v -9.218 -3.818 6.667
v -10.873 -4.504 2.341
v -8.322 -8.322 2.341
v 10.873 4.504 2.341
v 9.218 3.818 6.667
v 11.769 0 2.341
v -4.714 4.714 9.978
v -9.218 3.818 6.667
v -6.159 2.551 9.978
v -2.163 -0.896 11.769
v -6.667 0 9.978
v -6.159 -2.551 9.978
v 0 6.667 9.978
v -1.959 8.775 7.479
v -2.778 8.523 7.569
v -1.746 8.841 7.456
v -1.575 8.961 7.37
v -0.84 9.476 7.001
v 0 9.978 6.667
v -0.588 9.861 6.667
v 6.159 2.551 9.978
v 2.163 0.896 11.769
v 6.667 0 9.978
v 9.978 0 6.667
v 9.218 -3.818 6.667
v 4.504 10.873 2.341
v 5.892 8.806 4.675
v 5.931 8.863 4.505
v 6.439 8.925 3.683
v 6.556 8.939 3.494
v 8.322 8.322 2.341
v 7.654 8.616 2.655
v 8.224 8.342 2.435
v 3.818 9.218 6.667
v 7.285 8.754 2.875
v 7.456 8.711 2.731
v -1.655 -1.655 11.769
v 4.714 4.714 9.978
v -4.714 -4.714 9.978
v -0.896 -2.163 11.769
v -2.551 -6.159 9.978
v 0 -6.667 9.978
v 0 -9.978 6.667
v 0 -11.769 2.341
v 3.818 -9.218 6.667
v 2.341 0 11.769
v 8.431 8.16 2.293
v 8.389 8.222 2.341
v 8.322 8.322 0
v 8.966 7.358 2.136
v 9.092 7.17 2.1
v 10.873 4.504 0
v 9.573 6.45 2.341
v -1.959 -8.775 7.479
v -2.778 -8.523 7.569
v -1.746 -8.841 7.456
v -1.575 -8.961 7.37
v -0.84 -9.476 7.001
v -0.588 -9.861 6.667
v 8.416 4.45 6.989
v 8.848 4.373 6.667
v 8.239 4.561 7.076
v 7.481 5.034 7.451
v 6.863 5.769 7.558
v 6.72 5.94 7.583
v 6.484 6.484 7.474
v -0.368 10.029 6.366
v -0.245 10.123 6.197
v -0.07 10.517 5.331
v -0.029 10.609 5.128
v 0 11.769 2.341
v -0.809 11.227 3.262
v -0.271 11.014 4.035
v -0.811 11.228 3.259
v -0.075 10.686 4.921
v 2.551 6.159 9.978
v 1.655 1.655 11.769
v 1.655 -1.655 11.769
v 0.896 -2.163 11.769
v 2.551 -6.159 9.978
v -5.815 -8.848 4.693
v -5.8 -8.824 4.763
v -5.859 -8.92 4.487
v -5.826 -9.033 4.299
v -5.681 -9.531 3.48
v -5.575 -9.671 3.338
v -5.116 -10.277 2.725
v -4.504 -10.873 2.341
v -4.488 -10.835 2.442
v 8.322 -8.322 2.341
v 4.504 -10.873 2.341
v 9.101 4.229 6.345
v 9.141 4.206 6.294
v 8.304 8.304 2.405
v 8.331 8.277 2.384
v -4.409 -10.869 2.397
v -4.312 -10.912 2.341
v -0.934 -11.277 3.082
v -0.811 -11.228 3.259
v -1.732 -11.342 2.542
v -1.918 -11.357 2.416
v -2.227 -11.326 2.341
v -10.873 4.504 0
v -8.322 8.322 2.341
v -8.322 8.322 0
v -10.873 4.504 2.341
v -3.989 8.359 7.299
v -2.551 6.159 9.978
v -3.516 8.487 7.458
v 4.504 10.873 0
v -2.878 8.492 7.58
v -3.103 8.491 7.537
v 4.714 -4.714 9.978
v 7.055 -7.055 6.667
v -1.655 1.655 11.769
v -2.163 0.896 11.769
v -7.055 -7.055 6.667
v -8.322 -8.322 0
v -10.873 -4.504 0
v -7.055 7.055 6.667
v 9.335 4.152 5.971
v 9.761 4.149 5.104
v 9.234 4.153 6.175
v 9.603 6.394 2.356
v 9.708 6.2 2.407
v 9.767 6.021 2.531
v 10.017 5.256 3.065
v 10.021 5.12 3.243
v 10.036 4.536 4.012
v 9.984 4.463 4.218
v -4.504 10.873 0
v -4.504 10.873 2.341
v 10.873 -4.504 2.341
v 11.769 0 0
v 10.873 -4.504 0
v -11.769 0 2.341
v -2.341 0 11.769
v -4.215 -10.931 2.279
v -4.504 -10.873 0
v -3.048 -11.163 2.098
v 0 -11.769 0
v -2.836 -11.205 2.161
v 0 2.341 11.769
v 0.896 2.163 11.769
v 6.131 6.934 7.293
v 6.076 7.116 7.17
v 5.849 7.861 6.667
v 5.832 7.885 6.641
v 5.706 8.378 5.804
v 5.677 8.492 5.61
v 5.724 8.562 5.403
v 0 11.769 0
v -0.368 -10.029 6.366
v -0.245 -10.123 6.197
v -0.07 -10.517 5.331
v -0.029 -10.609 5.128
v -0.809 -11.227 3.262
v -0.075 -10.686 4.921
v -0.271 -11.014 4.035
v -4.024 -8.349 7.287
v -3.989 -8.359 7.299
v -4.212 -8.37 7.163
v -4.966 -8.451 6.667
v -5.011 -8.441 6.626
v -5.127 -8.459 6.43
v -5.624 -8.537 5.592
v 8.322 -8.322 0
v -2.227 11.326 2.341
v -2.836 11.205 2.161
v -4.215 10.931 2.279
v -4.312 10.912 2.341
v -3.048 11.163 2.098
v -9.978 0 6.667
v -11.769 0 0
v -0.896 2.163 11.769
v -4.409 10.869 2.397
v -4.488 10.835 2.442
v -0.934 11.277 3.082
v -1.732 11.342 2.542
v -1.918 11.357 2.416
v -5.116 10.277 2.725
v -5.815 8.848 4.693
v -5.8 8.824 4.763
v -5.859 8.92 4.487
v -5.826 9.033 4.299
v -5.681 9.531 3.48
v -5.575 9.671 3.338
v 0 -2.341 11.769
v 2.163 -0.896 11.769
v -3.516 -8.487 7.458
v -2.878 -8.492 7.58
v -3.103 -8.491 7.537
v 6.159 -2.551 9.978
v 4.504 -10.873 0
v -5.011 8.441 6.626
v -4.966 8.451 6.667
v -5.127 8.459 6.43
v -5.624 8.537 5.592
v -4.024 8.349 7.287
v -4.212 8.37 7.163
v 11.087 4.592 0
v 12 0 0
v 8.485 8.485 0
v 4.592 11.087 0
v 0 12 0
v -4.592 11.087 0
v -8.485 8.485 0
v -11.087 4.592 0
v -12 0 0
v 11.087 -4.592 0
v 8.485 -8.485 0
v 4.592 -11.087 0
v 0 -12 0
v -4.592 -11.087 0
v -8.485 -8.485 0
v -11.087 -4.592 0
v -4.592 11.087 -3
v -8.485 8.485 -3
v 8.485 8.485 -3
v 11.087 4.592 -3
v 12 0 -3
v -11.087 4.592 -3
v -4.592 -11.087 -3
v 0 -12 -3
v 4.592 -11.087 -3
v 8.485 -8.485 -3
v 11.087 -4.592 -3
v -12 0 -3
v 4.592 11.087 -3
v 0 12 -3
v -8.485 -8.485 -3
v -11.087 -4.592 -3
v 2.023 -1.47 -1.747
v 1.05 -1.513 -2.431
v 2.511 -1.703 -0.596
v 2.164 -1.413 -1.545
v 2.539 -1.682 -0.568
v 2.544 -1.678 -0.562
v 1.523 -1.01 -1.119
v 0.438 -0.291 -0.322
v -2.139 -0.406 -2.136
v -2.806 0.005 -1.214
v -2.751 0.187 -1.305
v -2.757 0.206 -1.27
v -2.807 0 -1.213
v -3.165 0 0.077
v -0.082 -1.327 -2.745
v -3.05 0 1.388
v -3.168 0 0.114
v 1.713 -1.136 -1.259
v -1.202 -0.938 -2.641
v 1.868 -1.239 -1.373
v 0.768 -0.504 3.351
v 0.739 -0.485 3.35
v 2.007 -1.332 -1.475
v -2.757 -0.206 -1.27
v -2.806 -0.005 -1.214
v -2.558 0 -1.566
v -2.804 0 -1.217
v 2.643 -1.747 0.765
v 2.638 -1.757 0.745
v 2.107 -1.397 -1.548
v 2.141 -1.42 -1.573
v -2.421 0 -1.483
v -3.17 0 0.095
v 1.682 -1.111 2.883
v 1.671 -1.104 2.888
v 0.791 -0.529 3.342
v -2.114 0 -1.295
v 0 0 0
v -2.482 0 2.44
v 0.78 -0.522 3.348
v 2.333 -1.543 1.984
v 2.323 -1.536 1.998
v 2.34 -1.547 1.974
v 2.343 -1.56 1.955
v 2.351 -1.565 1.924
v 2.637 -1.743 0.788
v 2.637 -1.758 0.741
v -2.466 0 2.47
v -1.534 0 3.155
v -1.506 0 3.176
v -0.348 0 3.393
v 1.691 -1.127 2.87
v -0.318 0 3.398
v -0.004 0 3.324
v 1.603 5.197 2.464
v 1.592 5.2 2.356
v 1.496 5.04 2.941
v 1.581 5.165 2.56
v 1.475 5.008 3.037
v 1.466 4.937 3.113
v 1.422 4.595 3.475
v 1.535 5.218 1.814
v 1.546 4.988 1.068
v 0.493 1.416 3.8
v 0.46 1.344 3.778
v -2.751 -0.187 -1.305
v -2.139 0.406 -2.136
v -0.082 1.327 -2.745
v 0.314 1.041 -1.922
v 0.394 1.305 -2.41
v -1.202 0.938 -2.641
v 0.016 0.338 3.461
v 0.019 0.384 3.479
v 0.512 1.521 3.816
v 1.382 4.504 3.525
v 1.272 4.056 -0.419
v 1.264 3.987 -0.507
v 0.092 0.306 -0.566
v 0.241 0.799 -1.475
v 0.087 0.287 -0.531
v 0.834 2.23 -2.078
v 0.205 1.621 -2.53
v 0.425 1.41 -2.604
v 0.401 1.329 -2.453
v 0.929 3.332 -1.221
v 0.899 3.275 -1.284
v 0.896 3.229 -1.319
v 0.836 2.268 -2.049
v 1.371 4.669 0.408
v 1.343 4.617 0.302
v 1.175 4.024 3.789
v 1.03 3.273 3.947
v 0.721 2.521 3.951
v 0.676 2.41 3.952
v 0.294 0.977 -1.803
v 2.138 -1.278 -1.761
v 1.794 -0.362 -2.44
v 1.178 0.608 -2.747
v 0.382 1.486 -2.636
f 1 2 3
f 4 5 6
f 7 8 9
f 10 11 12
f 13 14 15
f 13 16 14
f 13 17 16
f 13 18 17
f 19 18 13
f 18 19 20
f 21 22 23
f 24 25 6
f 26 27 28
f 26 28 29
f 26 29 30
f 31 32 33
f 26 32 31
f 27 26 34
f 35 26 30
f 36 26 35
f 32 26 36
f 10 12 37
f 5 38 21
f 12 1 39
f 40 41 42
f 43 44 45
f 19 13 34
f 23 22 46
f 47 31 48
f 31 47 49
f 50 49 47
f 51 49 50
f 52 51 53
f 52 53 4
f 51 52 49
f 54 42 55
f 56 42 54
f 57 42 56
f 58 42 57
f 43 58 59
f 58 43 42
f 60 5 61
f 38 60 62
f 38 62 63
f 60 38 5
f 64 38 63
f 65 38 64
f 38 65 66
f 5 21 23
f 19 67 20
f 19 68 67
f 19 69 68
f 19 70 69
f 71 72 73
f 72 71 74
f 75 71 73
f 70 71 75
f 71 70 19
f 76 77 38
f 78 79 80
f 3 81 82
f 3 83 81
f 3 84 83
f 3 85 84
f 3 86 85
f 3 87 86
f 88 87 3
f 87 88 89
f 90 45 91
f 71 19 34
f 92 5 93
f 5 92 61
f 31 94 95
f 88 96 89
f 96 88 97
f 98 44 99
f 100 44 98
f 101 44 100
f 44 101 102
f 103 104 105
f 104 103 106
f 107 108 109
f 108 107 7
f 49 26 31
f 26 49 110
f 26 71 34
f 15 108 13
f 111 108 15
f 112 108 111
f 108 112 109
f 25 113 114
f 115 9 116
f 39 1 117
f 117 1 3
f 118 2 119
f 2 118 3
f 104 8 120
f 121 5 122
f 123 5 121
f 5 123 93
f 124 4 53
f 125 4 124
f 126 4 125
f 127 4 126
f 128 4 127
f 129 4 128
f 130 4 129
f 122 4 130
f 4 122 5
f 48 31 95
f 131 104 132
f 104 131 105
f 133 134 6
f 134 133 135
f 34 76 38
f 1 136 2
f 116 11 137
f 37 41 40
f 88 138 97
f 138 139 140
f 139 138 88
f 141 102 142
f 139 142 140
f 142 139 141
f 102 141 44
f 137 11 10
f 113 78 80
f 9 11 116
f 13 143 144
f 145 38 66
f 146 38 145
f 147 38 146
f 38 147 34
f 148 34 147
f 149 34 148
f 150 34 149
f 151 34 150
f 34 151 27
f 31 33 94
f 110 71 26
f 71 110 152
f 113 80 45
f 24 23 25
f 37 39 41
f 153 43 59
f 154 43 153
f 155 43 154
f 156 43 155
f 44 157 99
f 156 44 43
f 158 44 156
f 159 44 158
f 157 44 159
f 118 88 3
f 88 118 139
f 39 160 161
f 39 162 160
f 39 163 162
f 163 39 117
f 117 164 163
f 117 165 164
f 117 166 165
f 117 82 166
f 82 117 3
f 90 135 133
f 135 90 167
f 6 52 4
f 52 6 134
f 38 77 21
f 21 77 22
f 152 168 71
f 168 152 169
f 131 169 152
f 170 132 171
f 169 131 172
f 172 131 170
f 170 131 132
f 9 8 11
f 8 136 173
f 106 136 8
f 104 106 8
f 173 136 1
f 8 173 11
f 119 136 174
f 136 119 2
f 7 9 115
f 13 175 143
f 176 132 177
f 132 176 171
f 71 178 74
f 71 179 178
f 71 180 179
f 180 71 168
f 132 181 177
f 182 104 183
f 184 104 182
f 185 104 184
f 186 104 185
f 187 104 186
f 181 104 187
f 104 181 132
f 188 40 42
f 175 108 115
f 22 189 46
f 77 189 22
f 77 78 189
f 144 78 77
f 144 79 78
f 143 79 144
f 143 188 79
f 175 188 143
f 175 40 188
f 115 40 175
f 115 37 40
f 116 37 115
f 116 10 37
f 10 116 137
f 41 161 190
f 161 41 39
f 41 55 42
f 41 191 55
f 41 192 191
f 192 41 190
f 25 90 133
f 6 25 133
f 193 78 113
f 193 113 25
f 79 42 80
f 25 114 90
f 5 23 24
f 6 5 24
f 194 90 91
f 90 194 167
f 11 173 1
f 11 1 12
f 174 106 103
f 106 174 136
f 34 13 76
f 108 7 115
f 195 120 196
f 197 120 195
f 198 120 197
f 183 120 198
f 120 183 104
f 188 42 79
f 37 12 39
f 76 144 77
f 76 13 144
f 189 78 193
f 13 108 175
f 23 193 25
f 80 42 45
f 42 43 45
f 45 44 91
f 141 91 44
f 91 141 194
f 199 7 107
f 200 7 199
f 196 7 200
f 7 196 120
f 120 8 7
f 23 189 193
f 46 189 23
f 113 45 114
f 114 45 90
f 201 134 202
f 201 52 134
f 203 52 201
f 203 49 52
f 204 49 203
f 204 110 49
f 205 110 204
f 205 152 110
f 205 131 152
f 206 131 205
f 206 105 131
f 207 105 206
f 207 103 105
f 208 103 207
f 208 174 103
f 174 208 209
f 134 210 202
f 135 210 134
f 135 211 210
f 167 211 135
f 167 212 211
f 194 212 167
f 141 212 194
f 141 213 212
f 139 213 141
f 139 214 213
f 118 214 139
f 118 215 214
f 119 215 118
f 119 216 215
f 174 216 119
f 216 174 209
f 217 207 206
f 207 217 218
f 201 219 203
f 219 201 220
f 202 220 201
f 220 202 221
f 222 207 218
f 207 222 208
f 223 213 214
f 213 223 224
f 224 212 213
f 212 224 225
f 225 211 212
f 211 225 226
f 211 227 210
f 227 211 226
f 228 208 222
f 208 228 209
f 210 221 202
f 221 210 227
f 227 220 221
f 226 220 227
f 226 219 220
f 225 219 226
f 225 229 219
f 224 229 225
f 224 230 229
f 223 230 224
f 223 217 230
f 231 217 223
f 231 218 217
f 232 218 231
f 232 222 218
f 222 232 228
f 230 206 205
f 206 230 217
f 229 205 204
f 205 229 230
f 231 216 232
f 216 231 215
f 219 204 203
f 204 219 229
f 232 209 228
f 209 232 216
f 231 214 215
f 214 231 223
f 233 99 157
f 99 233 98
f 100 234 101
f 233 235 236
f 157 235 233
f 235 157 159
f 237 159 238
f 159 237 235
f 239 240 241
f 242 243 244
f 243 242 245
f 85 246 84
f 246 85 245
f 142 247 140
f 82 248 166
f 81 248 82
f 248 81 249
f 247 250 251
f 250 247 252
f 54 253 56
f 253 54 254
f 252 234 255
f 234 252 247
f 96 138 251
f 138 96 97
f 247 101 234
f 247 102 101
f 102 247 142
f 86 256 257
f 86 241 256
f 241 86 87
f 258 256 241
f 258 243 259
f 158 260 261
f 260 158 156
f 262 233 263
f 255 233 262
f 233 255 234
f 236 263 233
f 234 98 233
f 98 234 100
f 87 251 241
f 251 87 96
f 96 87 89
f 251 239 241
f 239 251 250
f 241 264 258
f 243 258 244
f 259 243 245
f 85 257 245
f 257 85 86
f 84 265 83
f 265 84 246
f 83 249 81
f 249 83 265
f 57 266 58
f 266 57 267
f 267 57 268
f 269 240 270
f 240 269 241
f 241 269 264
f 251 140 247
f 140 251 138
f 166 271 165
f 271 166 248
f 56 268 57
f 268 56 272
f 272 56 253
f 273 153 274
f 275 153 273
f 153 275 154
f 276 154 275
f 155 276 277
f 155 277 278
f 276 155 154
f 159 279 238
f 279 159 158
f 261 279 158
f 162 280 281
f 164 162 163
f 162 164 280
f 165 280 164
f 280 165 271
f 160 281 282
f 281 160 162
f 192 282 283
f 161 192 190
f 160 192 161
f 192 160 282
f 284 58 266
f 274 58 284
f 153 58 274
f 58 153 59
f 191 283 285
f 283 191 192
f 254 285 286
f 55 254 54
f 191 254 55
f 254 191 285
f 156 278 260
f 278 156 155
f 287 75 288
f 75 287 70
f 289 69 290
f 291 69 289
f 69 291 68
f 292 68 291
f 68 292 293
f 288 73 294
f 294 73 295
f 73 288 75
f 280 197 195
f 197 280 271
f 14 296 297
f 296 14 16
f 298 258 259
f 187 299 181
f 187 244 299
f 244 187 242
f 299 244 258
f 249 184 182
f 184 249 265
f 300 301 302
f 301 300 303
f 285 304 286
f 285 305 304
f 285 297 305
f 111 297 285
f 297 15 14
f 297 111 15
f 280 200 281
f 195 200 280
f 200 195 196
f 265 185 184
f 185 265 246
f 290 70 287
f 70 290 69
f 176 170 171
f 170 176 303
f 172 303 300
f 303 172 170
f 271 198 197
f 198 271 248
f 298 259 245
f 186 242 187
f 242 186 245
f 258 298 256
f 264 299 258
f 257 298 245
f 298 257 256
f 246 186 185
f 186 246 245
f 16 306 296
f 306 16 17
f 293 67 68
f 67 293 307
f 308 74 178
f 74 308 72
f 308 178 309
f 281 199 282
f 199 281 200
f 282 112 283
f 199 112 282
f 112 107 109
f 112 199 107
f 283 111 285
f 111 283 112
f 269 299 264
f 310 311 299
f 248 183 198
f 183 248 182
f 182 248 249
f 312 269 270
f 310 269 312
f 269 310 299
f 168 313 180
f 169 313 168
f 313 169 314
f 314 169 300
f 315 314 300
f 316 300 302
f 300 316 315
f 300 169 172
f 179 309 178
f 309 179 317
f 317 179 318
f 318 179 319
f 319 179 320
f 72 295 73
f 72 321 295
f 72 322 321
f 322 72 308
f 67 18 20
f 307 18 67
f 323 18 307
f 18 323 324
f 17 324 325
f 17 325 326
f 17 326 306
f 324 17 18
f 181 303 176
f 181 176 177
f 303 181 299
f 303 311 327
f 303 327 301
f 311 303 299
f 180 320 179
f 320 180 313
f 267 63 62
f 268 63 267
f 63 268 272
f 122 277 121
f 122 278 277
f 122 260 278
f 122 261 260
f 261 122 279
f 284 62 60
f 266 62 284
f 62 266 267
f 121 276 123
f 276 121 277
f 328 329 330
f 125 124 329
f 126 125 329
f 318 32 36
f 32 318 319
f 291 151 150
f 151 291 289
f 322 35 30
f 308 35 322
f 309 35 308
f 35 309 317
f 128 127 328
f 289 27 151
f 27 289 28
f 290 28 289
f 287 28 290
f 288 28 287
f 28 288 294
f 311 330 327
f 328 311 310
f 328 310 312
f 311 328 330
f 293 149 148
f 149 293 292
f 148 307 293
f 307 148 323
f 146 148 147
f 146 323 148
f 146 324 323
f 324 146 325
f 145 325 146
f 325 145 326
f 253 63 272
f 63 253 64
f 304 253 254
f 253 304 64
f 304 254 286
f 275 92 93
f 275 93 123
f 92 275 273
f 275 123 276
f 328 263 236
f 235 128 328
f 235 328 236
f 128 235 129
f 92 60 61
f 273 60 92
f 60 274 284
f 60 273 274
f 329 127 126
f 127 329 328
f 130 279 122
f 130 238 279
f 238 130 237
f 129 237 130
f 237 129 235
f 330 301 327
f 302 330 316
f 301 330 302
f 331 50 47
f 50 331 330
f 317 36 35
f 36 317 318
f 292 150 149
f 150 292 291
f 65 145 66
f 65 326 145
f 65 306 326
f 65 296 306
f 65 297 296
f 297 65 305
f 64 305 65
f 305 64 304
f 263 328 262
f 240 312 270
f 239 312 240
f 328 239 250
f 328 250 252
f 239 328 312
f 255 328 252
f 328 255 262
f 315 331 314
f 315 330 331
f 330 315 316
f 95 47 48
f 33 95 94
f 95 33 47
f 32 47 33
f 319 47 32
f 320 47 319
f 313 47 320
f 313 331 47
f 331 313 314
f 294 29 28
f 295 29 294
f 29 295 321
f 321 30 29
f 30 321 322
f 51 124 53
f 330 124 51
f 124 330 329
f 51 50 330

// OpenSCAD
// Find the unitary vector with direction v. Fails if v=[0,0,0].           
function unit(v) = norm(v)>0 ? v/norm(v) : undef;                          
// Find the transpose of a rectangular matrix                              
function transpose(m) = // m is any rectangular matrix of objects          
  [ for(j=[0:len(m[0])-1]) [ for(i=[0:len(m)-1]) m[i][j] ] ];              
// The identity matrix with dimension n                                    
function identity(n) = [for(i=[0:n-1]) [for(j=[0:n-1]) i==j ? 1 : 0] ];    
                                                                           
// computes the rotation with minimum angle that brings a to b             
// the code fails if a and b are opposed to each other                     
function rotate_from_to(a,b) =                                             
    let( axis = unit(cross(a,b)) )                                         
    axis*axis >= 0.99 ?                                                    
        transpose([unit(b), axis, cross(axis, unit(b))]) *                 
            [unit(a), axis, cross(axis, unit(a))] :                        
        identity(3);                                                       
                                                                           
module line(p0, p1, diameter=1) {                                          
    v = p1-p0;                                                             
    translate(p0)                                                          
        // rotate the cylinder so its z axis is brought to direction v     
        multmatrix(rotate_from_to([0,0,1],v))                              
            cylinder(d=diameter, h=norm(v), $fn=16);                       
}                                                                          
scale(60) difference() {
 union() {
  difference() {
   sphere(0.2, $fn=16);
   translate([0,0,-1]) cube(2, center=true, $fn=16);
  }
  translate([0,0,-0.05]) cylinder(0.05, 0.2, 0.2, $fn=16);
 }
 line([-0.26111648393354714,-0.8660254037844386,0.4264014327112208], [0.0,0.0,-0.0], diameter=0.10166666666666666);
 line([-0.26111648393354714,0.8660254037844386,0.4264014327112208], [0.0,0.0,-0.0], diameter=0.10166666666666666);
 line([0.6963106238227909,0.5773502691896257,0.4264014327112208], [0.0,0.0,-0.0], diameter=0.10166666666666666);
}
